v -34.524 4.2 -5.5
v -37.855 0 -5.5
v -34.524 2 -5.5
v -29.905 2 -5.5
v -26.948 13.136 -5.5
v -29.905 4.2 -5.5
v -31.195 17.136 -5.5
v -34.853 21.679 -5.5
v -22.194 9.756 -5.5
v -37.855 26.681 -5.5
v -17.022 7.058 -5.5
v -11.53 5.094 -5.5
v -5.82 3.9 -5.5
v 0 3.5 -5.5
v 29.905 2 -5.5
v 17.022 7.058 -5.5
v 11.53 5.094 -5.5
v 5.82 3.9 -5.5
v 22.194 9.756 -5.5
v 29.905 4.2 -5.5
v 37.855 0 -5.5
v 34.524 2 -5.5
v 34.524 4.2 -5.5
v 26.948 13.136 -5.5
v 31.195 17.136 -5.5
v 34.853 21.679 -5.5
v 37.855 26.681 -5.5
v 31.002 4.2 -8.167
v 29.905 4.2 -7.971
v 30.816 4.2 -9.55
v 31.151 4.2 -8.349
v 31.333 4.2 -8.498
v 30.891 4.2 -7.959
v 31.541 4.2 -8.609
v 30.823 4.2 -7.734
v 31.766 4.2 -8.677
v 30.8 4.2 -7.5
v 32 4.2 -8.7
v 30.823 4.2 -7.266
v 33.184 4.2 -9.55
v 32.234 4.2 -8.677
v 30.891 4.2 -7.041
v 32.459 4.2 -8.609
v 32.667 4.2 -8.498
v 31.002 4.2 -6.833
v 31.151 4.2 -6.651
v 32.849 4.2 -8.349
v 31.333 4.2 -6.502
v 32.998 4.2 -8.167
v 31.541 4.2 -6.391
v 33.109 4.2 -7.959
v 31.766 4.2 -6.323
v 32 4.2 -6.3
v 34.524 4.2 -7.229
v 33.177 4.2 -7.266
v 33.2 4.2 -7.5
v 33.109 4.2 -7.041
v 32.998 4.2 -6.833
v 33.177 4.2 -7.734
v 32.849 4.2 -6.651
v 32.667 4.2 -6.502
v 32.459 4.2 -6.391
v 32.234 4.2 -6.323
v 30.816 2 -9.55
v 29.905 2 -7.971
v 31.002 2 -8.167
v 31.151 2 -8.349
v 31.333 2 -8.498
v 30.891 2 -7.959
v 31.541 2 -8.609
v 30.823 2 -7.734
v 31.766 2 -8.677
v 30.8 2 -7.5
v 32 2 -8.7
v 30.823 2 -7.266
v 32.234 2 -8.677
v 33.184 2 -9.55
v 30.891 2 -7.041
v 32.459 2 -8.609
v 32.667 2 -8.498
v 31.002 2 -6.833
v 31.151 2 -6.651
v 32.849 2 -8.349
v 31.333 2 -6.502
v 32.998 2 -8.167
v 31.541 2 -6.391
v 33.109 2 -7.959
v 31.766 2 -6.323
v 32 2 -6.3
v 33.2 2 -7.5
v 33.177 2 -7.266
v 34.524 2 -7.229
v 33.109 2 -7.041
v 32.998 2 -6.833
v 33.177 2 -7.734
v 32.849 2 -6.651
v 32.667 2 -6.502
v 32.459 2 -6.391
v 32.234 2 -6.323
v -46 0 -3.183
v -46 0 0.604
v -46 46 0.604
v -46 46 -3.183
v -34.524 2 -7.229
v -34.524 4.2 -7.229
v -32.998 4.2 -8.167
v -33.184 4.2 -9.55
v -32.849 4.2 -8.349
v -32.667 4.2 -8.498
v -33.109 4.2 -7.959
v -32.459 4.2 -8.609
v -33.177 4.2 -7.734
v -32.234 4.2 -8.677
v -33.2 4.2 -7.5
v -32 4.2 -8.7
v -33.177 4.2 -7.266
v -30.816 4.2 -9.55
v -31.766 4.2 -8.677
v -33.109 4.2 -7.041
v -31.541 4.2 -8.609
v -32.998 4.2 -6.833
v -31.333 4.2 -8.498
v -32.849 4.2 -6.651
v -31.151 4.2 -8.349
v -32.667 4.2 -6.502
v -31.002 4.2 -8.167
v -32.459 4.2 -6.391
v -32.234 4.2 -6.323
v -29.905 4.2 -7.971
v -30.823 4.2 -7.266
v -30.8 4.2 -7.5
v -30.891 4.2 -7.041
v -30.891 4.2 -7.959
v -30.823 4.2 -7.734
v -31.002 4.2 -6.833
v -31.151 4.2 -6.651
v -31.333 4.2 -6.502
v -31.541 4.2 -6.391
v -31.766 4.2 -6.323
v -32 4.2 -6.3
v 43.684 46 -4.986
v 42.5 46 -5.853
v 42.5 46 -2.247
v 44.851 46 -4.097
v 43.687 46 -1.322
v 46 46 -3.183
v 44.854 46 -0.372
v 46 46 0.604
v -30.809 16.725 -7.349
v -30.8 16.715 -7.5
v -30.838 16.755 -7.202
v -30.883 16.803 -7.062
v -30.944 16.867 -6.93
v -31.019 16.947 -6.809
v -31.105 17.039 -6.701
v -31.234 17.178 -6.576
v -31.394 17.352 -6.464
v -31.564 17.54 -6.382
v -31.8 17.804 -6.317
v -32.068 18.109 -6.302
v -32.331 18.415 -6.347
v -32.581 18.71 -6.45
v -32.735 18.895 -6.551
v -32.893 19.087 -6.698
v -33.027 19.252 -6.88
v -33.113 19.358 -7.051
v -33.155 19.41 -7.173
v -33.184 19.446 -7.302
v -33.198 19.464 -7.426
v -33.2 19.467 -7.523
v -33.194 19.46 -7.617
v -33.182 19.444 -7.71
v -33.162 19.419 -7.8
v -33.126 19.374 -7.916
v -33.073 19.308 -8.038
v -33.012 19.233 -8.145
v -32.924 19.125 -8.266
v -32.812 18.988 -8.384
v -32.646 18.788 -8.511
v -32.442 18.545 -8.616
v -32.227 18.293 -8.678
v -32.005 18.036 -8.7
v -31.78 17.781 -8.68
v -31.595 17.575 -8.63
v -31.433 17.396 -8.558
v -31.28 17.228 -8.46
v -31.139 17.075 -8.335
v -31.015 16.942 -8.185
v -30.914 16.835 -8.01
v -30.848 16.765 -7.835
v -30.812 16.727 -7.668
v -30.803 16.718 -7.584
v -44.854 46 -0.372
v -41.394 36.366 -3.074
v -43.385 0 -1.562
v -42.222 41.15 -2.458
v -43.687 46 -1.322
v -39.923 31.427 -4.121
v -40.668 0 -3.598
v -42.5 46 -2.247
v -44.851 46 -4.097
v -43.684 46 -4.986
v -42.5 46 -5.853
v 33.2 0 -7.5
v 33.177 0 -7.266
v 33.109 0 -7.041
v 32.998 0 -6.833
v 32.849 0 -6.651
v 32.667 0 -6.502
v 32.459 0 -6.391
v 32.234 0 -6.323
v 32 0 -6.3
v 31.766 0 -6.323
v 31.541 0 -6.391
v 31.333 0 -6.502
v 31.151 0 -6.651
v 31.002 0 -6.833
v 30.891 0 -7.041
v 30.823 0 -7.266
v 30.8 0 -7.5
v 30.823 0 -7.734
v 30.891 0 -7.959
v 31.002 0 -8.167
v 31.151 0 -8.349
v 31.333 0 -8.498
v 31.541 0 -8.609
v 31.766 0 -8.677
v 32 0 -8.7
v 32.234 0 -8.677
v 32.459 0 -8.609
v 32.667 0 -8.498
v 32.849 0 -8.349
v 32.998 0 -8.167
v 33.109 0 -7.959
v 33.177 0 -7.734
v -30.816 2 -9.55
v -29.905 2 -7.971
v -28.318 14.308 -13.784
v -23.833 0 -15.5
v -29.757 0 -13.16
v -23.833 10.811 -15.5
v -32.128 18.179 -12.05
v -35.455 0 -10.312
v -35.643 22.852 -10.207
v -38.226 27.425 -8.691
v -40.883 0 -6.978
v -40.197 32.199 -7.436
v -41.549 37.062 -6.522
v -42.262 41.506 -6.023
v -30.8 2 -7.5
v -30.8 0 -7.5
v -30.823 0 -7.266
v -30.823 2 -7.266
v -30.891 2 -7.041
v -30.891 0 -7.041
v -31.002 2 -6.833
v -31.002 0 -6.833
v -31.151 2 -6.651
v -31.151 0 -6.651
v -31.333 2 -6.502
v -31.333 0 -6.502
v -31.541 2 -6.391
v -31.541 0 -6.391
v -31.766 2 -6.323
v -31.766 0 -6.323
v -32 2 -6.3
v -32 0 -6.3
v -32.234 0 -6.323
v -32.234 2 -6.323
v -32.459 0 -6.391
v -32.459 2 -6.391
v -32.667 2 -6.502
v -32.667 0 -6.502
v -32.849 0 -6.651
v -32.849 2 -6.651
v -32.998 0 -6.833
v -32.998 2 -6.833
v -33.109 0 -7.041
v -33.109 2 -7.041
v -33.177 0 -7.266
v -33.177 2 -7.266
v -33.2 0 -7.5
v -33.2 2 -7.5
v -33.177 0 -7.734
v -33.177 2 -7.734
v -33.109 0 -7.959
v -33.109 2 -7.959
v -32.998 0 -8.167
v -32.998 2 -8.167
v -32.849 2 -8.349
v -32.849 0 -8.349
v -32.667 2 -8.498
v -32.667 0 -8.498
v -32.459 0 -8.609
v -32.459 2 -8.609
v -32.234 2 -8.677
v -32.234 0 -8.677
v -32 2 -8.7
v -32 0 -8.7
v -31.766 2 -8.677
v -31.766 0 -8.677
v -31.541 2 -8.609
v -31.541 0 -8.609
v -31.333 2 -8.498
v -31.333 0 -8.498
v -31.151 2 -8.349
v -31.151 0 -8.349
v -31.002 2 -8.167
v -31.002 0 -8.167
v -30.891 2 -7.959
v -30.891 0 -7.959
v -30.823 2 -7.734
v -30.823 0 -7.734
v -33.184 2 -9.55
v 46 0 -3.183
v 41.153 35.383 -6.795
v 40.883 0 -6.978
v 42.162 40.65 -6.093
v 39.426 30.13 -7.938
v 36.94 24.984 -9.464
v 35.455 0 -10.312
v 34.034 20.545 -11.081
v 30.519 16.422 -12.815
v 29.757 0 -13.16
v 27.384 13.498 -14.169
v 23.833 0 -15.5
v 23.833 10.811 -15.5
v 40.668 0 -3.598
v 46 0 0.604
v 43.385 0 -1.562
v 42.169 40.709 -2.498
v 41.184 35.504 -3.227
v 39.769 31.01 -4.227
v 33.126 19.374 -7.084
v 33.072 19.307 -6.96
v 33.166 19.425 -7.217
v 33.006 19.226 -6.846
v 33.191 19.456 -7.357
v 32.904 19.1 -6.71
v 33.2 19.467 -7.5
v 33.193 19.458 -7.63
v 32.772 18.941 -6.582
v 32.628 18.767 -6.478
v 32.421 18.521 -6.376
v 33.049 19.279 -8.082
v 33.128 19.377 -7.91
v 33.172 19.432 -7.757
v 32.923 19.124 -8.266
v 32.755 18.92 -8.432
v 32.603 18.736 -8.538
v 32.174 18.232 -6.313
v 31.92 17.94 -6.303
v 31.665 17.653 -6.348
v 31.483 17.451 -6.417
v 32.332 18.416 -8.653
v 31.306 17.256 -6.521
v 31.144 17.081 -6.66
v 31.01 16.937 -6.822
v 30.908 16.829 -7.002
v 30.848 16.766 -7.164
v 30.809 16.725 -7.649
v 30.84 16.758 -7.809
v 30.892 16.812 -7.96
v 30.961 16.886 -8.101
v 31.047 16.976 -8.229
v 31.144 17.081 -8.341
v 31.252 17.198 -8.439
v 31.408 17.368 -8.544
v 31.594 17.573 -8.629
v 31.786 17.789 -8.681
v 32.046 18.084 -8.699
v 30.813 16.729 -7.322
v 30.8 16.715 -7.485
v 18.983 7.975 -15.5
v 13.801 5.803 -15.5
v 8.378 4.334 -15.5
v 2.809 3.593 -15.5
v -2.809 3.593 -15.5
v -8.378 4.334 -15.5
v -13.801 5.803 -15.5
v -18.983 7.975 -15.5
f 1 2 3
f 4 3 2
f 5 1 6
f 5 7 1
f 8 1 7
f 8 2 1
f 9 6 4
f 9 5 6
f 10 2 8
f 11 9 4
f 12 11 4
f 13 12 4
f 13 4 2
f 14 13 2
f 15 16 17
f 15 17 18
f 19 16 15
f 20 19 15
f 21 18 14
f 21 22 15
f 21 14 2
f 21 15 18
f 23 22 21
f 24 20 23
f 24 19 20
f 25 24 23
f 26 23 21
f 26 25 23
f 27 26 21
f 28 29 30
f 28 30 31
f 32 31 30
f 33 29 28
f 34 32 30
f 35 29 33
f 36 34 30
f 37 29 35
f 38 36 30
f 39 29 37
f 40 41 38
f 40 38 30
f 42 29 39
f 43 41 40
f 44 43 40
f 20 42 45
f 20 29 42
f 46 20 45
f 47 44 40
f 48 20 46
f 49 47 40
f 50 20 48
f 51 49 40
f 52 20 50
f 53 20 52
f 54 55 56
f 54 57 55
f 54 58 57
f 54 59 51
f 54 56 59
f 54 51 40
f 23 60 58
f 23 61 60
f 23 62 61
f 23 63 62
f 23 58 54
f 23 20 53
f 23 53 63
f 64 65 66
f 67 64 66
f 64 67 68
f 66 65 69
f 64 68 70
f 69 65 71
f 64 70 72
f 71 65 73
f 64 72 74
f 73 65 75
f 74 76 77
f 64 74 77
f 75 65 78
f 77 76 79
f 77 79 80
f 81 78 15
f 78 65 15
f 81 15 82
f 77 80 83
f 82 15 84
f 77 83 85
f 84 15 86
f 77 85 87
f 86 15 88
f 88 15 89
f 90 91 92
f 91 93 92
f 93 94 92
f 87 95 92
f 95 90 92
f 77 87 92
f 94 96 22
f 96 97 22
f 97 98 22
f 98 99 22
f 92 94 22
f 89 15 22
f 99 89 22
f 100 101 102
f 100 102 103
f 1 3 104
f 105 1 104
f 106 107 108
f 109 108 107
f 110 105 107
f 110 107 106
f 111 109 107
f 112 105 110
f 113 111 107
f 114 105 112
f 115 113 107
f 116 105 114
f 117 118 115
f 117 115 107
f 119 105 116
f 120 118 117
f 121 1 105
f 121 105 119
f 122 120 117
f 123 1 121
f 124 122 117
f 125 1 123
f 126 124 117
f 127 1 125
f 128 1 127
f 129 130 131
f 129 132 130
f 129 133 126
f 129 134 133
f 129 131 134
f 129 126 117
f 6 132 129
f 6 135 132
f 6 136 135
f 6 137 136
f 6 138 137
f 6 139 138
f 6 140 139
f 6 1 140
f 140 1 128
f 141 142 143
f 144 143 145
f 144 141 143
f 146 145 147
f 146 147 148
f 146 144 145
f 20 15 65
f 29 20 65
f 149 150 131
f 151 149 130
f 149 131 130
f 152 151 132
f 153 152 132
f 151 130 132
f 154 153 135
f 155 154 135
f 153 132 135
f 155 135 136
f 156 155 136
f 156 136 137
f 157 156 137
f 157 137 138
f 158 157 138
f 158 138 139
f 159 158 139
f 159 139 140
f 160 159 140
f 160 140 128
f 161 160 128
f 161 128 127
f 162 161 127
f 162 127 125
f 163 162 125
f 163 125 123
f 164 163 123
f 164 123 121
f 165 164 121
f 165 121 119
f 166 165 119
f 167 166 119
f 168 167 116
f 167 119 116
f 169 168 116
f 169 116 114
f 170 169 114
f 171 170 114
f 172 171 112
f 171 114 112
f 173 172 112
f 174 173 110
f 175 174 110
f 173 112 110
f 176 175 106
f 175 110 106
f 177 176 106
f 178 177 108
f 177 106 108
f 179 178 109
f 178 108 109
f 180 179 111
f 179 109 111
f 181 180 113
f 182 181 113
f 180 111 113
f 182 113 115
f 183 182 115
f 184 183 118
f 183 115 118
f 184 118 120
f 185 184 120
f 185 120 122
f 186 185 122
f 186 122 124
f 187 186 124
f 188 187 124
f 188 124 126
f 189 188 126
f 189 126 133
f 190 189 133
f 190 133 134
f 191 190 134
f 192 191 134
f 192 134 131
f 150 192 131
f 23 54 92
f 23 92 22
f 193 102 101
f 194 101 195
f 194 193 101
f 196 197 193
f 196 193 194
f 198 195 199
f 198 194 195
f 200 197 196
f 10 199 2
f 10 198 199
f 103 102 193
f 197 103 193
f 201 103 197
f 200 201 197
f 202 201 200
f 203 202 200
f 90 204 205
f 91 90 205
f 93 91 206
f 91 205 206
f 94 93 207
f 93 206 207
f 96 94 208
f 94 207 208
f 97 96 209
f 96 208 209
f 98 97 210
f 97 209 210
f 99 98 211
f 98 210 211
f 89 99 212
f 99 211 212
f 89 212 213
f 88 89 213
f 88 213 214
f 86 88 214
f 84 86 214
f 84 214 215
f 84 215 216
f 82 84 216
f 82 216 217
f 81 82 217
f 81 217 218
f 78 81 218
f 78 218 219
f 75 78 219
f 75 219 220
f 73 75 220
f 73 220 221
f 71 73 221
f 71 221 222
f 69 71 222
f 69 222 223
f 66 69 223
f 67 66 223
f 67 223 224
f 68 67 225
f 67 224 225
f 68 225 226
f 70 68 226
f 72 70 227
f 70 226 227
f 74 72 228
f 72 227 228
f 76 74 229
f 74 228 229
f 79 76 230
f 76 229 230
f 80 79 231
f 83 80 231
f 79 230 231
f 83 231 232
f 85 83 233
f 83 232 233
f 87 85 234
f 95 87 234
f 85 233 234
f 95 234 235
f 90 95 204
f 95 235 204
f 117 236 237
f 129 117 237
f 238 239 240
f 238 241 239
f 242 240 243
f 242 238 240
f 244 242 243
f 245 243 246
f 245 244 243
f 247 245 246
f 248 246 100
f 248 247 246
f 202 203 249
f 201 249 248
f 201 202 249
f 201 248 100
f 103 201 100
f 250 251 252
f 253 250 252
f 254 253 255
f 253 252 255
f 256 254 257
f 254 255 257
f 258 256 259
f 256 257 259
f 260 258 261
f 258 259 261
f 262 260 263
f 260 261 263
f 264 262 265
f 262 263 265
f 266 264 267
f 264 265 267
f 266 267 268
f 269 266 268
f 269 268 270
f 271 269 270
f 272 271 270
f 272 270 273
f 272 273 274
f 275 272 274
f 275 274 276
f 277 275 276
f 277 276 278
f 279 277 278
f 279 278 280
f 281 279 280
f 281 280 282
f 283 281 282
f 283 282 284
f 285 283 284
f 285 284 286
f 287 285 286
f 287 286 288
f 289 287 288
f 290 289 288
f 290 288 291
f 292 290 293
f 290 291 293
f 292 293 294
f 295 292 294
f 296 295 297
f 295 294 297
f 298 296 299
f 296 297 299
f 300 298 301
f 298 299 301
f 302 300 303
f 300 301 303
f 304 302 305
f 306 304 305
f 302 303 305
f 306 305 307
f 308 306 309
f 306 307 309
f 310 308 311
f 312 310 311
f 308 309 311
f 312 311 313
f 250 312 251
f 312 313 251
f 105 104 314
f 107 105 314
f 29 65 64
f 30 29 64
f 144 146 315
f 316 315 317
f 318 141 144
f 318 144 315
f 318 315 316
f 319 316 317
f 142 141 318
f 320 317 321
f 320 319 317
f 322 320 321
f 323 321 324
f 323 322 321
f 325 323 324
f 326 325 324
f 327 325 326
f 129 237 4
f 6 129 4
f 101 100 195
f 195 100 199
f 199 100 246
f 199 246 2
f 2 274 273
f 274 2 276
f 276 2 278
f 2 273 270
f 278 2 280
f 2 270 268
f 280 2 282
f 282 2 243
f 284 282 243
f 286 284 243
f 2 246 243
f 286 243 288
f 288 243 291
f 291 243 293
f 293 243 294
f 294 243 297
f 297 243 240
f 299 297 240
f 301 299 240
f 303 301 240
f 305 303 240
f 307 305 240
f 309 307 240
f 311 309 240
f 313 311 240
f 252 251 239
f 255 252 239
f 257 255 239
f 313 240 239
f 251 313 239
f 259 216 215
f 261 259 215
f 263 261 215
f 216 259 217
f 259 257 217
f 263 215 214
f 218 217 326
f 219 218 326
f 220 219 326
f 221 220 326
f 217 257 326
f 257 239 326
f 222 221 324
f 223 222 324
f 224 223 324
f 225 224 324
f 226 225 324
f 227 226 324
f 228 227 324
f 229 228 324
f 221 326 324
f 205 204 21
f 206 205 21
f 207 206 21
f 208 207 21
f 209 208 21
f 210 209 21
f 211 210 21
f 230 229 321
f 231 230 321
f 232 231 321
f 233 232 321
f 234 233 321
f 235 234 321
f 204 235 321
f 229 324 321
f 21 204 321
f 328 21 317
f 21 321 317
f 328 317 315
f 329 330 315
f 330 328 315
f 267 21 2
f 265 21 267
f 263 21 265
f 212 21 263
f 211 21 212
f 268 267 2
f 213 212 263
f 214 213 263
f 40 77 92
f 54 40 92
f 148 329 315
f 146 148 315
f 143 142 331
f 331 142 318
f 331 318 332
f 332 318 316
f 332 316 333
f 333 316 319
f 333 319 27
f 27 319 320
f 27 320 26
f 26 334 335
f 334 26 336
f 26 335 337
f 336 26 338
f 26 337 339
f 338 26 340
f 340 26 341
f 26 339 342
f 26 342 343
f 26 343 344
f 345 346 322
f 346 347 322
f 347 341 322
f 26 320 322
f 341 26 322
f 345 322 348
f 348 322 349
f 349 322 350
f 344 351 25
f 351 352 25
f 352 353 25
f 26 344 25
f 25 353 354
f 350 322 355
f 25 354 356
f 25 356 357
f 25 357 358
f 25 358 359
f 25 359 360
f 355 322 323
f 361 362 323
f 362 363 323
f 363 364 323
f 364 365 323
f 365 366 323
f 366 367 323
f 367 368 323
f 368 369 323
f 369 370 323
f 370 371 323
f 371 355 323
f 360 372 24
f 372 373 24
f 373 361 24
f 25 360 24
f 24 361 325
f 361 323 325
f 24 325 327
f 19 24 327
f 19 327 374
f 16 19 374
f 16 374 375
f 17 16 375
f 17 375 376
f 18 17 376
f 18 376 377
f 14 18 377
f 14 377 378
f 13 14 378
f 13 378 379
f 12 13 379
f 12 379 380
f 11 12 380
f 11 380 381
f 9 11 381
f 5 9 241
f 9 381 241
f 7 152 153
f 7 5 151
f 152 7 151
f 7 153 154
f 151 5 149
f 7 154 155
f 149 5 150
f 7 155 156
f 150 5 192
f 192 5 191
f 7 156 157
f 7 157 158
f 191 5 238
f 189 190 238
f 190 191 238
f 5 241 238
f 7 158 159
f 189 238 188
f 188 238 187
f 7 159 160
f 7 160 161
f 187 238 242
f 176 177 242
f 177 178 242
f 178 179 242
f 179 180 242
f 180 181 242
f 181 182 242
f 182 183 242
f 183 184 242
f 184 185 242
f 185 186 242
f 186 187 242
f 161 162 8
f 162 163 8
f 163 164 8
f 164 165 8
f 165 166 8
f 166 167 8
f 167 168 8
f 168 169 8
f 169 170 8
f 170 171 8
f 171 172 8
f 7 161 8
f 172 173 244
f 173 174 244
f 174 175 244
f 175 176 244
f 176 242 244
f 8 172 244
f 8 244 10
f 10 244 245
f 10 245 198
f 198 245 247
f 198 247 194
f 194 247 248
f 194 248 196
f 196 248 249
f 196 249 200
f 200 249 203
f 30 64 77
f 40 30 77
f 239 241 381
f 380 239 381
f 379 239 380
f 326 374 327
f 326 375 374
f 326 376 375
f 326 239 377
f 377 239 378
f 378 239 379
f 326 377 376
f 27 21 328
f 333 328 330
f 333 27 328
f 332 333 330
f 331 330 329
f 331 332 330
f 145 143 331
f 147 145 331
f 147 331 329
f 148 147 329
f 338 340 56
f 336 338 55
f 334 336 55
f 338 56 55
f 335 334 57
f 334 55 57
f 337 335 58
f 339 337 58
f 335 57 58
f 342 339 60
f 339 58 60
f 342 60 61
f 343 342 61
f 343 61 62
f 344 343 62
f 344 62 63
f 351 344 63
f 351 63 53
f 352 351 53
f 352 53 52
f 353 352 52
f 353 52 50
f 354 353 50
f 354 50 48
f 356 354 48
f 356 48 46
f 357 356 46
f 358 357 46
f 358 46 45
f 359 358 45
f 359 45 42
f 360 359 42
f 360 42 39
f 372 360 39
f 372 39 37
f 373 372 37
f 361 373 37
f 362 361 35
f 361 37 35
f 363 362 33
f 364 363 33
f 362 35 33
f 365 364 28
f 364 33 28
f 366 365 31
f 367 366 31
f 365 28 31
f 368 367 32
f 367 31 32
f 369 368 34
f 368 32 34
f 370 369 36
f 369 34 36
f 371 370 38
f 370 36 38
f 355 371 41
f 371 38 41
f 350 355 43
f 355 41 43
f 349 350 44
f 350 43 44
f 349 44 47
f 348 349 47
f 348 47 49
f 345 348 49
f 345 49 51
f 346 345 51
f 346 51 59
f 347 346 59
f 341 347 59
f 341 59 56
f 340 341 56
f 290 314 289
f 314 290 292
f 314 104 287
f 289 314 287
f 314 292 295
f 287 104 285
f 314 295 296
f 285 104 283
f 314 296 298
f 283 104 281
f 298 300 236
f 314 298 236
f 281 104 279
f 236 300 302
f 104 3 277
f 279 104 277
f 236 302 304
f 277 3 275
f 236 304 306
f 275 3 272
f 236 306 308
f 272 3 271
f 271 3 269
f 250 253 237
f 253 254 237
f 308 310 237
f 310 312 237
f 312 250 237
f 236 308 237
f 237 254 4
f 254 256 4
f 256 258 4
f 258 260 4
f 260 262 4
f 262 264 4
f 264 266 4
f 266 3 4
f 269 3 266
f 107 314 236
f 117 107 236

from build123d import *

# Parameters (mm, degrees)
SKETCH1_W           = 92
SKETCH1_H           = 31
BOSS_EXTRUDE1_DEPTH = 46
SKETCH2_R           = 103
SKETCH2_R_2         = 73
CUT_EXTRUDE1_DEPTH  = 47
SKETCH7_R           = 1.2
CUT_EXTRUDE5_DEPTH  = 47
CUT_EXTRUDE2_DEPTH  = 47
SKETCH5_R           = 42.5
CUT_EXTRUDE4_DEPTH  = 17.103780853
CUT_EXTRUDE6_START  = -2
CUT_EXTRUDE6_DEPTH  = 2.2


with BuildPart() as part:
    # Sketch1 → Boss-Extrude1 (new body)
    with BuildSketch(Plane(origin=(0, 0, 0), x_dir=(1, 0, 0), z_dir=(0, 1, 0))):
        Rectangle(SKETCH1_W, SKETCH1_H)
    extrude(amount=BOSS_EXTRUDE1_DEPTH)

    # Sketch2 → Cut-Extrude1 (cut, through all)
    with BuildSketch(Plane(origin=(0, 46, 0), x_dir=(1, 0, 0), z_dir=(0, 1, 0))):
        with Locations((0, -53.5)):
            Circle(SKETCH2_R)
        with Locations((0, -53.5)):
            Circle(SKETCH2_R_2, mode=Mode.SUBTRACT)
    extrude(amount=-CUT_EXTRUDE1_DEPTH, mode=Mode.SUBTRACT)

    # Sketch7 → Cut-Extrude5 (cut, through all)
    with BuildSketch(Plane.XZ):
        with Locations((-32, -7.5)):
            Circle(SKETCH7_R)
        with Locations((32, -7.5)):
            Circle(SKETCH7_R)
    extrude(amount=-CUT_EXTRUDE5_DEPTH, mode=Mode.SUBTRACT)

    # Sketch3 → Cut-Extrude2 (cut, through all)
    with BuildSketch(Plane(origin=(0, 46, 0), x_dir=(1, 0, 0), z_dir=(0, 1, 0))):
        with BuildLine():
            Line((-37.855118544, 5.5), (37.855118544, 5.5))
            ThreePointArc((37.855118544, 5.5), (0, -123.6), (-37.855118544, 5.5))
        make_face()
    extrude(amount=-CUT_EXTRUDE2_DEPTH, mode=Mode.SUBTRACT)

    # Sketch5 → Cut-Extrude4 (cut, through all)
    with BuildSketch(Plane(origin=(0, 0, -15.5), x_dir=(-1, 0, 0), z_dir=(0, 0, -1))):
        with Locations((0, 46)):
            Circle(SKETCH5_R)
    extrude(amount=-CUT_EXTRUDE4_DEPTH, mode=Mode.SUBTRACT)

    # Sketch8 → Cut-Extrude6 (cut)
    with BuildSketch(Plane.XZ.offset(CUT_EXTRUDE6_START)):
        Polygon((-34.523561667, -7.229062977), (-33.183568052, -9.55), (-30.816431948, -9.55), (-29.904759513, -7.970937023), (-29.904759513, -4.97225781), (-34.523561667, -4.97225781), align=None)
        Polygon((29.904759513, -4.97225781), (29.904759513, -7.970937023), (30.816431948, -9.55), (33.183568052, -9.55), (34.523561667, -7.229062977), (34.523561667, -4.97225781), align=None)
    extrude(amount=-CUT_EXTRUDE6_DEPTH, mode=Mode.SUBTRACT)


solid = part.part
